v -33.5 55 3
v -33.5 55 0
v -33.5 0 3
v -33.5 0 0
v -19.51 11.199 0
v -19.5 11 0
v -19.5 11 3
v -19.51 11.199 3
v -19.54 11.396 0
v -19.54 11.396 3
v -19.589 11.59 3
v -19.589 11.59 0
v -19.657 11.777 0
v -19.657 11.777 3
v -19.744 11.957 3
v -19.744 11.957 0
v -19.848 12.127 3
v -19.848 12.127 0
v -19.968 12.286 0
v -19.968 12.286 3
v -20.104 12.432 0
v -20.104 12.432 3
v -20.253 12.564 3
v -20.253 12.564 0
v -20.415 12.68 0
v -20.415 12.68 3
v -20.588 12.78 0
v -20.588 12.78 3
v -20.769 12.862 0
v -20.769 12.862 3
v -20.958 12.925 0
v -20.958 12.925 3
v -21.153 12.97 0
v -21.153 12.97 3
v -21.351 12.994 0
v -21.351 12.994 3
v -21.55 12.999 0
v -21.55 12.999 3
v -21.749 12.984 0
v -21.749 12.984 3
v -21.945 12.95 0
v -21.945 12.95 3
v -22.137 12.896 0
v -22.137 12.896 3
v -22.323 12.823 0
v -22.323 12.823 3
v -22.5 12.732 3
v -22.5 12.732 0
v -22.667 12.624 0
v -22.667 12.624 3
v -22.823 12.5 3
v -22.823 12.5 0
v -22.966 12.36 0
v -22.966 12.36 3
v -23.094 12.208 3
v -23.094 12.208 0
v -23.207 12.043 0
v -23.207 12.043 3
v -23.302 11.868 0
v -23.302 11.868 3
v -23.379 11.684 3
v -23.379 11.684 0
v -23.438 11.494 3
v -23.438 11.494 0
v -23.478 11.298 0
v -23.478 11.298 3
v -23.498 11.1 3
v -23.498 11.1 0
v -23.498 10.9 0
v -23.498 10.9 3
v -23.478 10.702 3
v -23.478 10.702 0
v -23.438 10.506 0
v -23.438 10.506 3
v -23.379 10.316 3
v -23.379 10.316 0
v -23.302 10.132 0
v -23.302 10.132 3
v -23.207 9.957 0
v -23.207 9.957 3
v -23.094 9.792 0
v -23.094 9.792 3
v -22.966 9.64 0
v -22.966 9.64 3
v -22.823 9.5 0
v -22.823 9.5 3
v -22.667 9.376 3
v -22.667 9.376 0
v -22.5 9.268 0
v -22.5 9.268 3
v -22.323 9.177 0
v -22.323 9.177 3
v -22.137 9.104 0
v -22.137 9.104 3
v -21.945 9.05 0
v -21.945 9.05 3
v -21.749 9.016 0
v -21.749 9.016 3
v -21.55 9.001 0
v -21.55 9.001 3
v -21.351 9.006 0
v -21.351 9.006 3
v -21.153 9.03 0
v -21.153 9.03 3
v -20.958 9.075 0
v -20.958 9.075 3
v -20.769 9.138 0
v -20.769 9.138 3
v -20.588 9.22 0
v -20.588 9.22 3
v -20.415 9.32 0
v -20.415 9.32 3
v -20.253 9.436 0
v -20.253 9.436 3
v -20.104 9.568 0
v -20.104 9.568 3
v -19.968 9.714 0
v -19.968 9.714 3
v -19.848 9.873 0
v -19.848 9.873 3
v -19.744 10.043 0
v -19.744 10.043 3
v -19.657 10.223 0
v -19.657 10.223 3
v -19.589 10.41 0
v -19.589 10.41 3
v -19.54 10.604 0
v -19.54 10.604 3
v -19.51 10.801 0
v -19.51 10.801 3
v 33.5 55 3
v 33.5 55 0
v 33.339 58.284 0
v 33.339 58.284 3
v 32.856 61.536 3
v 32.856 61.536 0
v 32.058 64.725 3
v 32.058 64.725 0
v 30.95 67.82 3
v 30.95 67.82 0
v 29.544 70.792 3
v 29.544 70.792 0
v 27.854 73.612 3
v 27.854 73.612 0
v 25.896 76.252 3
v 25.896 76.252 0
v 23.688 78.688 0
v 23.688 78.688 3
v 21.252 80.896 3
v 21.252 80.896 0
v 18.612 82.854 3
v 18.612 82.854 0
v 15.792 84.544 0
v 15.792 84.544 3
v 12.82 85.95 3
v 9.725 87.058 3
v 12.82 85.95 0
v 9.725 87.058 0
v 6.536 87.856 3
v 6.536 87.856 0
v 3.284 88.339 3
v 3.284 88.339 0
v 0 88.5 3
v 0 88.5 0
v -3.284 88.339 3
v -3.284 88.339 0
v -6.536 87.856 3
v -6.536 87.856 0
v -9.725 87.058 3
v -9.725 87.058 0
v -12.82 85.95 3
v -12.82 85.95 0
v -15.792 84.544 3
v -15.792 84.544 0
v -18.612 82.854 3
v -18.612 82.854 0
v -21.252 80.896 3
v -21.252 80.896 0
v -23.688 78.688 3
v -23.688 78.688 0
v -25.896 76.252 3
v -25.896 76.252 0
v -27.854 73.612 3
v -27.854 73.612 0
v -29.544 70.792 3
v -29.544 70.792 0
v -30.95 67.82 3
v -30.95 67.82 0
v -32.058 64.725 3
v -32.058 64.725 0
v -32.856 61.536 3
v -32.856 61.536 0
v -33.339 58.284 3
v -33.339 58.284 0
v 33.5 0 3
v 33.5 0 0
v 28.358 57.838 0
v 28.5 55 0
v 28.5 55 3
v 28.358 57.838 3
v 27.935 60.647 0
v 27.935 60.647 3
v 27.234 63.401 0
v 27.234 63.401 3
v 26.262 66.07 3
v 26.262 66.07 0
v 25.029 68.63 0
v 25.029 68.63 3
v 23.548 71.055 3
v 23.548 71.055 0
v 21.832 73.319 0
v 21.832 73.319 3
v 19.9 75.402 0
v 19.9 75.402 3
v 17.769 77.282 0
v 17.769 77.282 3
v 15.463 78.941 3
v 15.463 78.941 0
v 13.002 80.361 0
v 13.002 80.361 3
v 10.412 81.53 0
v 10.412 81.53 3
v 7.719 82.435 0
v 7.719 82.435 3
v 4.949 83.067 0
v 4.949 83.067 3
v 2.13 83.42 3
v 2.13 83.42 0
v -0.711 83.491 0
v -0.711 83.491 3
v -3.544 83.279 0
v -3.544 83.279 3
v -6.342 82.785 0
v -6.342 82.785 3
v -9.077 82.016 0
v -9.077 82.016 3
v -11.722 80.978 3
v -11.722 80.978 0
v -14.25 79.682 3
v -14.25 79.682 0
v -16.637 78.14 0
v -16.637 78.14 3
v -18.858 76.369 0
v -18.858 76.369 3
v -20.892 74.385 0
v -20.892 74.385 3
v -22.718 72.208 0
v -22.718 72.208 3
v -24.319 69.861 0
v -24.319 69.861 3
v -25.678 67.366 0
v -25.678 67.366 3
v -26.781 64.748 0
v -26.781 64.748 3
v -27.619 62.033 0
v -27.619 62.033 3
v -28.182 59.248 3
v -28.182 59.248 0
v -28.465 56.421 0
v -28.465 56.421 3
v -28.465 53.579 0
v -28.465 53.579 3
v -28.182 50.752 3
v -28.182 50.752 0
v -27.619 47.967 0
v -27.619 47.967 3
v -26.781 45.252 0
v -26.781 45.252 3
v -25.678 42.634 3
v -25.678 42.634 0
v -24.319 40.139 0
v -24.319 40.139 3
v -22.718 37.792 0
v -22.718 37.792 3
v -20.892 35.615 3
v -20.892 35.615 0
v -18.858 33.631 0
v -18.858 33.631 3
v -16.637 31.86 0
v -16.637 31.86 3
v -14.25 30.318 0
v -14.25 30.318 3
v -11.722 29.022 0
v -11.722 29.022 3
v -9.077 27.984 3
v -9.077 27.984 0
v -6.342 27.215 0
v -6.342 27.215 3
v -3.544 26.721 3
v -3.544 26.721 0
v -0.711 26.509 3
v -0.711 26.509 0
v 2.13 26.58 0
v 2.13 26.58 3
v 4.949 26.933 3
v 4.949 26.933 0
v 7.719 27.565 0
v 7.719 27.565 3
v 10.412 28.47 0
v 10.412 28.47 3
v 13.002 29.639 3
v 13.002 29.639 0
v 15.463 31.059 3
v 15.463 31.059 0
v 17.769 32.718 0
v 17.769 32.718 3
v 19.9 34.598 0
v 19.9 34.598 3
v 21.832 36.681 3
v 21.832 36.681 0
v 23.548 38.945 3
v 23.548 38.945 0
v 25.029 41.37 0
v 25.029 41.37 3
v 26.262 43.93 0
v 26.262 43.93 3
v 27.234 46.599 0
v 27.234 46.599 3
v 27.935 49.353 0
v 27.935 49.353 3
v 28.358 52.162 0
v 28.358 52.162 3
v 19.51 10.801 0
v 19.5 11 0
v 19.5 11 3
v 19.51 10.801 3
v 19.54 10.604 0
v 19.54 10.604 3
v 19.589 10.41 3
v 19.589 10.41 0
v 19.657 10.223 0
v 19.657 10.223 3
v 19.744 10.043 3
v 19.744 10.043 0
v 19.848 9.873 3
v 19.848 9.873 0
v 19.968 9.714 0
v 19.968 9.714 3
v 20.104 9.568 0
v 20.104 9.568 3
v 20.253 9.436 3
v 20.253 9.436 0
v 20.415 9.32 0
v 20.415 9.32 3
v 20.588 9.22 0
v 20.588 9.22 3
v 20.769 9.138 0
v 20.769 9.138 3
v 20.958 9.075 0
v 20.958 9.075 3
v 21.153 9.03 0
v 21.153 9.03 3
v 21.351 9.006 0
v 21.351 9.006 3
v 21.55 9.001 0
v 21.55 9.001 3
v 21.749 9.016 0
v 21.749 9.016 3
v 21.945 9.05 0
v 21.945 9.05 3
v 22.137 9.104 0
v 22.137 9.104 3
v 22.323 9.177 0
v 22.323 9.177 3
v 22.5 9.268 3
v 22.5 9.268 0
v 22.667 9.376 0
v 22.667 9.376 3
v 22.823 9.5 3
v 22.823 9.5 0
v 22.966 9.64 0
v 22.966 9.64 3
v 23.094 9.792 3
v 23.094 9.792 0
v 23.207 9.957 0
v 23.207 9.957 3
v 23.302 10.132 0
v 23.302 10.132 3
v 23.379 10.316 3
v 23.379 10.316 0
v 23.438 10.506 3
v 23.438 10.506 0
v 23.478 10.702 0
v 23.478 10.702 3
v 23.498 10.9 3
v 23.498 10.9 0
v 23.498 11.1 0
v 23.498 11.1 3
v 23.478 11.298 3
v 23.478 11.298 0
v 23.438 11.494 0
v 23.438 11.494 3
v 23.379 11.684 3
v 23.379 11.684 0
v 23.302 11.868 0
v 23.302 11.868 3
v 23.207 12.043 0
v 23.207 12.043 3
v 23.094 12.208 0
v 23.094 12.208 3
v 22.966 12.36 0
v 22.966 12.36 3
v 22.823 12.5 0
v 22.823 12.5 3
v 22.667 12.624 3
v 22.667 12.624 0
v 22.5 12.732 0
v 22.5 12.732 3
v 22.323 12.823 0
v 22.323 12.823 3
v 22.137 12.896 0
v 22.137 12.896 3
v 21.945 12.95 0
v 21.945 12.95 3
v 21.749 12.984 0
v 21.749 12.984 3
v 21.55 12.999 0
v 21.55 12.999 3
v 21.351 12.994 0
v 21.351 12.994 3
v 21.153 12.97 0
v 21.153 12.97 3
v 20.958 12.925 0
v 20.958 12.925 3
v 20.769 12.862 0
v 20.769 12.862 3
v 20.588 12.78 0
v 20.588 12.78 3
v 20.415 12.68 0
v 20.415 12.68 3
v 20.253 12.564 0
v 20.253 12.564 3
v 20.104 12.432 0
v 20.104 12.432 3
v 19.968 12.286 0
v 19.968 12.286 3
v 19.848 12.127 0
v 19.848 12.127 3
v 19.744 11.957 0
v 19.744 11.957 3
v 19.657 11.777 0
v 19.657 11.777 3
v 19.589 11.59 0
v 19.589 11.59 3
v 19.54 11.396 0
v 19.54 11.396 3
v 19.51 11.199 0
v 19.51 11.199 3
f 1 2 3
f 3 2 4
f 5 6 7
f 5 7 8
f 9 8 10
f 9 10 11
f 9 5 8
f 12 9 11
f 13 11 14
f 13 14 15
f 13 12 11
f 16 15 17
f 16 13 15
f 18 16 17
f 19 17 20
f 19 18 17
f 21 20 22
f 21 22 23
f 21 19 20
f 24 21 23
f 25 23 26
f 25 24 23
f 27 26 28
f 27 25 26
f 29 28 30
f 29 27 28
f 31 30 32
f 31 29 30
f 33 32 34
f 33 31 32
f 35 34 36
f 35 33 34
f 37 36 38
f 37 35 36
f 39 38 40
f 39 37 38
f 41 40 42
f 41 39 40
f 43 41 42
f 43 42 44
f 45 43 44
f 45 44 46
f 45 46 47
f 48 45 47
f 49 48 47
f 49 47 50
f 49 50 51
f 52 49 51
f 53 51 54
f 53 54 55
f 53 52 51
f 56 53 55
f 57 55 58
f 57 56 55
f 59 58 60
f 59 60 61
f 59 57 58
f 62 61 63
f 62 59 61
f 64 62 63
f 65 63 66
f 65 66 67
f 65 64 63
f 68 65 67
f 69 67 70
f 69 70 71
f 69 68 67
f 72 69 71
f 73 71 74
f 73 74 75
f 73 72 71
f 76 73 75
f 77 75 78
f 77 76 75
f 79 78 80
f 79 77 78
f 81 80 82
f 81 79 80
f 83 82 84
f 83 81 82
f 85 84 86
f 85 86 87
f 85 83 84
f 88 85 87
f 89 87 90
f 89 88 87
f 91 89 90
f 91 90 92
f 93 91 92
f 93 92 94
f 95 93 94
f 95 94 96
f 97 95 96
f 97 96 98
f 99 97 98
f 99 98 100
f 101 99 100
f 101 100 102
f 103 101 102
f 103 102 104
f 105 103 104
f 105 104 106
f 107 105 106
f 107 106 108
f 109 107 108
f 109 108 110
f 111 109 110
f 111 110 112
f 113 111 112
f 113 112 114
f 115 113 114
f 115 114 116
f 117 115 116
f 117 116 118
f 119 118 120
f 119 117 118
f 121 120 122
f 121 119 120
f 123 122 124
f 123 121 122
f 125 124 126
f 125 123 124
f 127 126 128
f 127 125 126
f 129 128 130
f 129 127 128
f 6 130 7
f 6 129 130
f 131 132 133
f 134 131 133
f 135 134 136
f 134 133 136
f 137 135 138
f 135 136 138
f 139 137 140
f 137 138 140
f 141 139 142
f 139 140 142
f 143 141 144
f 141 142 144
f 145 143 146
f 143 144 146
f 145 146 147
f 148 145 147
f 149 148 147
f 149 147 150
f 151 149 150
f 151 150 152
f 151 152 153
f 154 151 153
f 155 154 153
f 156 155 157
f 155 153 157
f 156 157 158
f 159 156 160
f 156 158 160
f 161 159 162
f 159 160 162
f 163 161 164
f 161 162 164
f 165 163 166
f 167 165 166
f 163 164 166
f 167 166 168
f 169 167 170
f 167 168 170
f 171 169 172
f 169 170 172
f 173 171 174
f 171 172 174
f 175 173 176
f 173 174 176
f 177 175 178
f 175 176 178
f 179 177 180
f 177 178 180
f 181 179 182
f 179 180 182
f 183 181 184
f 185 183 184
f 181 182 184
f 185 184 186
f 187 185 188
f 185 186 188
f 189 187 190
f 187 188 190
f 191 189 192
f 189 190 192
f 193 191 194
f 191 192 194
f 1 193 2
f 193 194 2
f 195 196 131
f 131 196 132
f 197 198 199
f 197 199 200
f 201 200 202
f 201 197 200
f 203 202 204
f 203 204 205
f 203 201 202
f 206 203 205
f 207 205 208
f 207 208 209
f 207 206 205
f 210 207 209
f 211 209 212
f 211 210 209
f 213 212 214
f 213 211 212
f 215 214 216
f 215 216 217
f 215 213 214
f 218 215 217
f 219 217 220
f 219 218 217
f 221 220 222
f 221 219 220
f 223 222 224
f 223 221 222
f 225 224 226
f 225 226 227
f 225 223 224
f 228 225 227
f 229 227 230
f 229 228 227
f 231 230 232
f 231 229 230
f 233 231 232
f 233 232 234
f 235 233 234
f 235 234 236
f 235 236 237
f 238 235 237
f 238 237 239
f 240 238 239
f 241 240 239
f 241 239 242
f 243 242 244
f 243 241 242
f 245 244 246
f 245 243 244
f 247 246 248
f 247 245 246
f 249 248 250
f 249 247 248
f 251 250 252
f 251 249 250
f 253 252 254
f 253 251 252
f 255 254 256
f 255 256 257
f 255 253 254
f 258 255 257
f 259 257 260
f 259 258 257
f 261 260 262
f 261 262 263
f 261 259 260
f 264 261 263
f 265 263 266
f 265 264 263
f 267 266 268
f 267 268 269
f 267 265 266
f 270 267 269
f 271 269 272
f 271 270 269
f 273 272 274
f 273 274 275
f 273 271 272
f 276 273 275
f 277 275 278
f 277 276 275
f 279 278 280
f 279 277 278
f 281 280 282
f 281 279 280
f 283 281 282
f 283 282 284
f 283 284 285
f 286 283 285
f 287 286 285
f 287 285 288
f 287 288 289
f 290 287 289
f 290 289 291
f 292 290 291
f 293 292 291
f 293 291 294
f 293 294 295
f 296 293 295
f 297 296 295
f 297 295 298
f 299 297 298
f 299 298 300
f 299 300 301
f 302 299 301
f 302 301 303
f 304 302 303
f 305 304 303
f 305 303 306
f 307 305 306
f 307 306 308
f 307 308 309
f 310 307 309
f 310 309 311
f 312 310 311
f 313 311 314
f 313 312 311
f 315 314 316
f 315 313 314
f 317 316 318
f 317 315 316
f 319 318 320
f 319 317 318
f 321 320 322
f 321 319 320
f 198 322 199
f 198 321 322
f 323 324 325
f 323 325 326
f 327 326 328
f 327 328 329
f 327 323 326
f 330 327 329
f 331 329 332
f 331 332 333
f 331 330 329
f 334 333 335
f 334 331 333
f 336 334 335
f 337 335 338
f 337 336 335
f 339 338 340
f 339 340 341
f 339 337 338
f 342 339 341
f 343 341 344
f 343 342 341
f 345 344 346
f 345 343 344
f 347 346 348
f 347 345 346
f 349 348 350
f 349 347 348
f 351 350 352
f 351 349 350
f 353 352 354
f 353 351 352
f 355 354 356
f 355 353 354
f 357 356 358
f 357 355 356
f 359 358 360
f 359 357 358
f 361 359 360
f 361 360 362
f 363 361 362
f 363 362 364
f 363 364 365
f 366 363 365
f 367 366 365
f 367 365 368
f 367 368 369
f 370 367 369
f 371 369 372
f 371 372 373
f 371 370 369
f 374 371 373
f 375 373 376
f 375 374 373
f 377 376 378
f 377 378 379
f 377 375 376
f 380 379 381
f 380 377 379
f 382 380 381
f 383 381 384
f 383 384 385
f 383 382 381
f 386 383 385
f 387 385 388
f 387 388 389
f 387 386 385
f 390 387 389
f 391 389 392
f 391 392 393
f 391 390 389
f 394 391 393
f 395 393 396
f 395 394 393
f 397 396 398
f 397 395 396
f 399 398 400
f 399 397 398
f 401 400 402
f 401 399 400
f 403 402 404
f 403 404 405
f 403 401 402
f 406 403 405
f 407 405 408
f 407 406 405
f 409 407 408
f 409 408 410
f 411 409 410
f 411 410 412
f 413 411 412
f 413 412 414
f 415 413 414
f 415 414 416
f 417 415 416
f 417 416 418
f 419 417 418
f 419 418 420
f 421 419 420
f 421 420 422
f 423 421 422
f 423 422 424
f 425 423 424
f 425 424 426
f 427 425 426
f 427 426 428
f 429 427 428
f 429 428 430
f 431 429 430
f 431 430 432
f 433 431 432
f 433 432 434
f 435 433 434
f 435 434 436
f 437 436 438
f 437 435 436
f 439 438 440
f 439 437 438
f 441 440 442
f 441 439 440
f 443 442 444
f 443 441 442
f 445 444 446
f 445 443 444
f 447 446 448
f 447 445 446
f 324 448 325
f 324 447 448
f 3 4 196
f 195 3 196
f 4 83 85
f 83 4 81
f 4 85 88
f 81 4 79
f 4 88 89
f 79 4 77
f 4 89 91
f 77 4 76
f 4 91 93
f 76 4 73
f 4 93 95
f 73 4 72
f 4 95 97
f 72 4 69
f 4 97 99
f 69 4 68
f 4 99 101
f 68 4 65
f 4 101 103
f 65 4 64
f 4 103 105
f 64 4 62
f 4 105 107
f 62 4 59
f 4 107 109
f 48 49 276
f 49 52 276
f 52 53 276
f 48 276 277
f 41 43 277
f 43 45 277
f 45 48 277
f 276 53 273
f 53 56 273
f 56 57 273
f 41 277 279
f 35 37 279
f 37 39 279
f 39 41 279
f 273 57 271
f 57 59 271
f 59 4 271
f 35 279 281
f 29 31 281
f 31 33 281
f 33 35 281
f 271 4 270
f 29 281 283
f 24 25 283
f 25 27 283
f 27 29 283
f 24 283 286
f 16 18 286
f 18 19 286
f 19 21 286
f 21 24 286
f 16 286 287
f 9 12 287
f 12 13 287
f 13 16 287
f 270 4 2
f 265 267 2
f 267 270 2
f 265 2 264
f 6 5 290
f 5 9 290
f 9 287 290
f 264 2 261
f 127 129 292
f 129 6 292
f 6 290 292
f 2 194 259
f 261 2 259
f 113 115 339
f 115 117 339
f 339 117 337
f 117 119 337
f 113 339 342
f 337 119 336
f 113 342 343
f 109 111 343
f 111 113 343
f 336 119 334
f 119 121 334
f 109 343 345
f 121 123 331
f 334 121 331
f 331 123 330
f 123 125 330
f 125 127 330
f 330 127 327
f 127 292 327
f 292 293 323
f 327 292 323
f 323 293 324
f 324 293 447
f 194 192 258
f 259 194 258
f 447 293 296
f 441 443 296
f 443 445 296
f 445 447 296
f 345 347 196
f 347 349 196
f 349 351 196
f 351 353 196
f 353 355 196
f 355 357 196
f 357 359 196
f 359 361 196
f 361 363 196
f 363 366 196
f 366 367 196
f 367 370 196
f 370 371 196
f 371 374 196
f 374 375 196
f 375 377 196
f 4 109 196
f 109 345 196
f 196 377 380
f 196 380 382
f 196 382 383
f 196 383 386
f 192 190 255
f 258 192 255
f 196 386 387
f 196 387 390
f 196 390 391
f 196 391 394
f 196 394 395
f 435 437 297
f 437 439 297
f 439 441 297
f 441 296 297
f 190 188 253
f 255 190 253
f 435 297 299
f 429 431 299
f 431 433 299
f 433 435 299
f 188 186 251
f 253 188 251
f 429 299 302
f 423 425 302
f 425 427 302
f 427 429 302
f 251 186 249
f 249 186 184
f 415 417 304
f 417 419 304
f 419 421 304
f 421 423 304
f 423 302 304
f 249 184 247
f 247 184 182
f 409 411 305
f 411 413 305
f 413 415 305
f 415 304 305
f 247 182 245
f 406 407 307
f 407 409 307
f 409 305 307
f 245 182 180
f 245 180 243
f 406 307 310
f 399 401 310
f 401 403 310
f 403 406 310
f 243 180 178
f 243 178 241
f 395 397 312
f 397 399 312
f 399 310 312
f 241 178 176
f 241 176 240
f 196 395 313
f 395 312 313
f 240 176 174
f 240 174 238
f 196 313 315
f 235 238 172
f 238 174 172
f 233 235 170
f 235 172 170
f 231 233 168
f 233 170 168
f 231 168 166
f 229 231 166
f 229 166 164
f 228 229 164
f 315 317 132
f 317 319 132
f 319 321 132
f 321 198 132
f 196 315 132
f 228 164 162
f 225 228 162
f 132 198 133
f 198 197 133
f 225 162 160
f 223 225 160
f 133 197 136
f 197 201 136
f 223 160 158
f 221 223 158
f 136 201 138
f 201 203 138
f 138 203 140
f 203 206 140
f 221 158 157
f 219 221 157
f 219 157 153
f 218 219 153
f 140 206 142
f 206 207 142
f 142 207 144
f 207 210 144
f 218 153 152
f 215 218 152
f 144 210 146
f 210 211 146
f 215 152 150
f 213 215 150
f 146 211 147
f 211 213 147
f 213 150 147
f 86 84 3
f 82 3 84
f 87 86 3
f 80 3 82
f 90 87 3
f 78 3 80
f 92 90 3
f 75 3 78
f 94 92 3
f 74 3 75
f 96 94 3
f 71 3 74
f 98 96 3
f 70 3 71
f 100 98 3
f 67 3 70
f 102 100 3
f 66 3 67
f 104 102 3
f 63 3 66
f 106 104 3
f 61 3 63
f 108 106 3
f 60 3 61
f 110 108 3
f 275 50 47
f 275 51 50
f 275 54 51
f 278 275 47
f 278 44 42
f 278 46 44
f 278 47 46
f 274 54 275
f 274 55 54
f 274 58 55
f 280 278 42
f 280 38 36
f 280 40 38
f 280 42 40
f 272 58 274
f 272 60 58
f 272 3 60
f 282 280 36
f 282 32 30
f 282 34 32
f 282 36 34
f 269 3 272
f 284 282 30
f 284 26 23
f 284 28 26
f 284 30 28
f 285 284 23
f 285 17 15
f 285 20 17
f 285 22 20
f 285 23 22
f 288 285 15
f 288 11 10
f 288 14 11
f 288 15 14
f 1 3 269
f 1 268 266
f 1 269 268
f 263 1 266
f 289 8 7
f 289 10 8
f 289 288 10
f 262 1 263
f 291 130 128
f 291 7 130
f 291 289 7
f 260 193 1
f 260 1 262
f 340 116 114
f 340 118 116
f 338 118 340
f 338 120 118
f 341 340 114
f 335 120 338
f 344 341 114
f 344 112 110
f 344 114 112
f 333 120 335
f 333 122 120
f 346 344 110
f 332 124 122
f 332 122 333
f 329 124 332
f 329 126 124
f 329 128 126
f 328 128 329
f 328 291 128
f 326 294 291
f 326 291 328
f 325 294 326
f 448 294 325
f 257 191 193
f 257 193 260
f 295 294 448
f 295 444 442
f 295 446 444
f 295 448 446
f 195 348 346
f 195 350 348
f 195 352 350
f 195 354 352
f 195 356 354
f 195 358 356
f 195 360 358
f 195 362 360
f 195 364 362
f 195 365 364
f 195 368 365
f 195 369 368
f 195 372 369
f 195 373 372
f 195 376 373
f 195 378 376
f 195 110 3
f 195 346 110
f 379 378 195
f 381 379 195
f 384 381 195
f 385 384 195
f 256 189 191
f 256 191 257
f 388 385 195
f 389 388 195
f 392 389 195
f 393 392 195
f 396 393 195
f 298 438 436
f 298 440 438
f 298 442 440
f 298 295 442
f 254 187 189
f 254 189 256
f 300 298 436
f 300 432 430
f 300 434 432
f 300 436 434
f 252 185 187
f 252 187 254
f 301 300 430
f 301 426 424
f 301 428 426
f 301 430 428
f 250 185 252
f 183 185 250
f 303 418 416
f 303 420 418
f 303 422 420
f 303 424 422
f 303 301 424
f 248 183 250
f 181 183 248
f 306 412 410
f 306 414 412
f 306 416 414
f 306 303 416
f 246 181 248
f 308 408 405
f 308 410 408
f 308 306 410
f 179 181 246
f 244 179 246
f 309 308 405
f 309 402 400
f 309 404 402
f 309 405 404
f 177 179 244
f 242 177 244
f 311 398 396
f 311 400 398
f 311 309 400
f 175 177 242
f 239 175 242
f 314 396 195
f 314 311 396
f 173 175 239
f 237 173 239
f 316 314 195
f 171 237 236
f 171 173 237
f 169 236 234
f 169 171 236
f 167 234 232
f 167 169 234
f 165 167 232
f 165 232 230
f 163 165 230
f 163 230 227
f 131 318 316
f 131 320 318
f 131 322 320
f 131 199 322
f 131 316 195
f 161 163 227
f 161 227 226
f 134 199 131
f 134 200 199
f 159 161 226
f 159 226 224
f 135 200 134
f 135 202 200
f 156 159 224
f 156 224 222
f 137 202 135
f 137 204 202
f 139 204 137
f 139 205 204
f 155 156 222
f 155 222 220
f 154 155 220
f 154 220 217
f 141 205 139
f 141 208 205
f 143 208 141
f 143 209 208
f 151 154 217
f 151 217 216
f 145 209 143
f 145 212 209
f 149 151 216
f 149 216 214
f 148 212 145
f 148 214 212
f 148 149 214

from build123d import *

# Parameters (mm, degrees)
SKETCH1_R           = 28.5
SKETCH1_R_2         = 2
BOSS_EXTRUDE1_DEPTH = 3


with BuildPart() as part:
    # Sketch1 → Boss-Extrude1 (new body)
    with BuildSketch(Plane.XY):
        with BuildLine():
            Line((-33.5, 0), (33.5, 0))
            Line((33.5, 0), (33.5, 55))
            ThreePointArc((33.5, 55), (0, 88.5), (-33.5, 55))
            Line((-33.5, 55), (-33.5, 0))
        make_face()
        with Locations((0, 55)):
            Circle(SKETCH1_R, mode=Mode.SUBTRACT)
        with Locations((-21.5, 11)):
            Circle(SKETCH1_R_2, mode=Mode.SUBTRACT)
        with Locations((21.5, 11)):
            Circle(SKETCH1_R_2, mode=Mode.SUBTRACT)
    extrude(amount=BOSS_EXTRUDE1_DEPTH)


solid = part.part
